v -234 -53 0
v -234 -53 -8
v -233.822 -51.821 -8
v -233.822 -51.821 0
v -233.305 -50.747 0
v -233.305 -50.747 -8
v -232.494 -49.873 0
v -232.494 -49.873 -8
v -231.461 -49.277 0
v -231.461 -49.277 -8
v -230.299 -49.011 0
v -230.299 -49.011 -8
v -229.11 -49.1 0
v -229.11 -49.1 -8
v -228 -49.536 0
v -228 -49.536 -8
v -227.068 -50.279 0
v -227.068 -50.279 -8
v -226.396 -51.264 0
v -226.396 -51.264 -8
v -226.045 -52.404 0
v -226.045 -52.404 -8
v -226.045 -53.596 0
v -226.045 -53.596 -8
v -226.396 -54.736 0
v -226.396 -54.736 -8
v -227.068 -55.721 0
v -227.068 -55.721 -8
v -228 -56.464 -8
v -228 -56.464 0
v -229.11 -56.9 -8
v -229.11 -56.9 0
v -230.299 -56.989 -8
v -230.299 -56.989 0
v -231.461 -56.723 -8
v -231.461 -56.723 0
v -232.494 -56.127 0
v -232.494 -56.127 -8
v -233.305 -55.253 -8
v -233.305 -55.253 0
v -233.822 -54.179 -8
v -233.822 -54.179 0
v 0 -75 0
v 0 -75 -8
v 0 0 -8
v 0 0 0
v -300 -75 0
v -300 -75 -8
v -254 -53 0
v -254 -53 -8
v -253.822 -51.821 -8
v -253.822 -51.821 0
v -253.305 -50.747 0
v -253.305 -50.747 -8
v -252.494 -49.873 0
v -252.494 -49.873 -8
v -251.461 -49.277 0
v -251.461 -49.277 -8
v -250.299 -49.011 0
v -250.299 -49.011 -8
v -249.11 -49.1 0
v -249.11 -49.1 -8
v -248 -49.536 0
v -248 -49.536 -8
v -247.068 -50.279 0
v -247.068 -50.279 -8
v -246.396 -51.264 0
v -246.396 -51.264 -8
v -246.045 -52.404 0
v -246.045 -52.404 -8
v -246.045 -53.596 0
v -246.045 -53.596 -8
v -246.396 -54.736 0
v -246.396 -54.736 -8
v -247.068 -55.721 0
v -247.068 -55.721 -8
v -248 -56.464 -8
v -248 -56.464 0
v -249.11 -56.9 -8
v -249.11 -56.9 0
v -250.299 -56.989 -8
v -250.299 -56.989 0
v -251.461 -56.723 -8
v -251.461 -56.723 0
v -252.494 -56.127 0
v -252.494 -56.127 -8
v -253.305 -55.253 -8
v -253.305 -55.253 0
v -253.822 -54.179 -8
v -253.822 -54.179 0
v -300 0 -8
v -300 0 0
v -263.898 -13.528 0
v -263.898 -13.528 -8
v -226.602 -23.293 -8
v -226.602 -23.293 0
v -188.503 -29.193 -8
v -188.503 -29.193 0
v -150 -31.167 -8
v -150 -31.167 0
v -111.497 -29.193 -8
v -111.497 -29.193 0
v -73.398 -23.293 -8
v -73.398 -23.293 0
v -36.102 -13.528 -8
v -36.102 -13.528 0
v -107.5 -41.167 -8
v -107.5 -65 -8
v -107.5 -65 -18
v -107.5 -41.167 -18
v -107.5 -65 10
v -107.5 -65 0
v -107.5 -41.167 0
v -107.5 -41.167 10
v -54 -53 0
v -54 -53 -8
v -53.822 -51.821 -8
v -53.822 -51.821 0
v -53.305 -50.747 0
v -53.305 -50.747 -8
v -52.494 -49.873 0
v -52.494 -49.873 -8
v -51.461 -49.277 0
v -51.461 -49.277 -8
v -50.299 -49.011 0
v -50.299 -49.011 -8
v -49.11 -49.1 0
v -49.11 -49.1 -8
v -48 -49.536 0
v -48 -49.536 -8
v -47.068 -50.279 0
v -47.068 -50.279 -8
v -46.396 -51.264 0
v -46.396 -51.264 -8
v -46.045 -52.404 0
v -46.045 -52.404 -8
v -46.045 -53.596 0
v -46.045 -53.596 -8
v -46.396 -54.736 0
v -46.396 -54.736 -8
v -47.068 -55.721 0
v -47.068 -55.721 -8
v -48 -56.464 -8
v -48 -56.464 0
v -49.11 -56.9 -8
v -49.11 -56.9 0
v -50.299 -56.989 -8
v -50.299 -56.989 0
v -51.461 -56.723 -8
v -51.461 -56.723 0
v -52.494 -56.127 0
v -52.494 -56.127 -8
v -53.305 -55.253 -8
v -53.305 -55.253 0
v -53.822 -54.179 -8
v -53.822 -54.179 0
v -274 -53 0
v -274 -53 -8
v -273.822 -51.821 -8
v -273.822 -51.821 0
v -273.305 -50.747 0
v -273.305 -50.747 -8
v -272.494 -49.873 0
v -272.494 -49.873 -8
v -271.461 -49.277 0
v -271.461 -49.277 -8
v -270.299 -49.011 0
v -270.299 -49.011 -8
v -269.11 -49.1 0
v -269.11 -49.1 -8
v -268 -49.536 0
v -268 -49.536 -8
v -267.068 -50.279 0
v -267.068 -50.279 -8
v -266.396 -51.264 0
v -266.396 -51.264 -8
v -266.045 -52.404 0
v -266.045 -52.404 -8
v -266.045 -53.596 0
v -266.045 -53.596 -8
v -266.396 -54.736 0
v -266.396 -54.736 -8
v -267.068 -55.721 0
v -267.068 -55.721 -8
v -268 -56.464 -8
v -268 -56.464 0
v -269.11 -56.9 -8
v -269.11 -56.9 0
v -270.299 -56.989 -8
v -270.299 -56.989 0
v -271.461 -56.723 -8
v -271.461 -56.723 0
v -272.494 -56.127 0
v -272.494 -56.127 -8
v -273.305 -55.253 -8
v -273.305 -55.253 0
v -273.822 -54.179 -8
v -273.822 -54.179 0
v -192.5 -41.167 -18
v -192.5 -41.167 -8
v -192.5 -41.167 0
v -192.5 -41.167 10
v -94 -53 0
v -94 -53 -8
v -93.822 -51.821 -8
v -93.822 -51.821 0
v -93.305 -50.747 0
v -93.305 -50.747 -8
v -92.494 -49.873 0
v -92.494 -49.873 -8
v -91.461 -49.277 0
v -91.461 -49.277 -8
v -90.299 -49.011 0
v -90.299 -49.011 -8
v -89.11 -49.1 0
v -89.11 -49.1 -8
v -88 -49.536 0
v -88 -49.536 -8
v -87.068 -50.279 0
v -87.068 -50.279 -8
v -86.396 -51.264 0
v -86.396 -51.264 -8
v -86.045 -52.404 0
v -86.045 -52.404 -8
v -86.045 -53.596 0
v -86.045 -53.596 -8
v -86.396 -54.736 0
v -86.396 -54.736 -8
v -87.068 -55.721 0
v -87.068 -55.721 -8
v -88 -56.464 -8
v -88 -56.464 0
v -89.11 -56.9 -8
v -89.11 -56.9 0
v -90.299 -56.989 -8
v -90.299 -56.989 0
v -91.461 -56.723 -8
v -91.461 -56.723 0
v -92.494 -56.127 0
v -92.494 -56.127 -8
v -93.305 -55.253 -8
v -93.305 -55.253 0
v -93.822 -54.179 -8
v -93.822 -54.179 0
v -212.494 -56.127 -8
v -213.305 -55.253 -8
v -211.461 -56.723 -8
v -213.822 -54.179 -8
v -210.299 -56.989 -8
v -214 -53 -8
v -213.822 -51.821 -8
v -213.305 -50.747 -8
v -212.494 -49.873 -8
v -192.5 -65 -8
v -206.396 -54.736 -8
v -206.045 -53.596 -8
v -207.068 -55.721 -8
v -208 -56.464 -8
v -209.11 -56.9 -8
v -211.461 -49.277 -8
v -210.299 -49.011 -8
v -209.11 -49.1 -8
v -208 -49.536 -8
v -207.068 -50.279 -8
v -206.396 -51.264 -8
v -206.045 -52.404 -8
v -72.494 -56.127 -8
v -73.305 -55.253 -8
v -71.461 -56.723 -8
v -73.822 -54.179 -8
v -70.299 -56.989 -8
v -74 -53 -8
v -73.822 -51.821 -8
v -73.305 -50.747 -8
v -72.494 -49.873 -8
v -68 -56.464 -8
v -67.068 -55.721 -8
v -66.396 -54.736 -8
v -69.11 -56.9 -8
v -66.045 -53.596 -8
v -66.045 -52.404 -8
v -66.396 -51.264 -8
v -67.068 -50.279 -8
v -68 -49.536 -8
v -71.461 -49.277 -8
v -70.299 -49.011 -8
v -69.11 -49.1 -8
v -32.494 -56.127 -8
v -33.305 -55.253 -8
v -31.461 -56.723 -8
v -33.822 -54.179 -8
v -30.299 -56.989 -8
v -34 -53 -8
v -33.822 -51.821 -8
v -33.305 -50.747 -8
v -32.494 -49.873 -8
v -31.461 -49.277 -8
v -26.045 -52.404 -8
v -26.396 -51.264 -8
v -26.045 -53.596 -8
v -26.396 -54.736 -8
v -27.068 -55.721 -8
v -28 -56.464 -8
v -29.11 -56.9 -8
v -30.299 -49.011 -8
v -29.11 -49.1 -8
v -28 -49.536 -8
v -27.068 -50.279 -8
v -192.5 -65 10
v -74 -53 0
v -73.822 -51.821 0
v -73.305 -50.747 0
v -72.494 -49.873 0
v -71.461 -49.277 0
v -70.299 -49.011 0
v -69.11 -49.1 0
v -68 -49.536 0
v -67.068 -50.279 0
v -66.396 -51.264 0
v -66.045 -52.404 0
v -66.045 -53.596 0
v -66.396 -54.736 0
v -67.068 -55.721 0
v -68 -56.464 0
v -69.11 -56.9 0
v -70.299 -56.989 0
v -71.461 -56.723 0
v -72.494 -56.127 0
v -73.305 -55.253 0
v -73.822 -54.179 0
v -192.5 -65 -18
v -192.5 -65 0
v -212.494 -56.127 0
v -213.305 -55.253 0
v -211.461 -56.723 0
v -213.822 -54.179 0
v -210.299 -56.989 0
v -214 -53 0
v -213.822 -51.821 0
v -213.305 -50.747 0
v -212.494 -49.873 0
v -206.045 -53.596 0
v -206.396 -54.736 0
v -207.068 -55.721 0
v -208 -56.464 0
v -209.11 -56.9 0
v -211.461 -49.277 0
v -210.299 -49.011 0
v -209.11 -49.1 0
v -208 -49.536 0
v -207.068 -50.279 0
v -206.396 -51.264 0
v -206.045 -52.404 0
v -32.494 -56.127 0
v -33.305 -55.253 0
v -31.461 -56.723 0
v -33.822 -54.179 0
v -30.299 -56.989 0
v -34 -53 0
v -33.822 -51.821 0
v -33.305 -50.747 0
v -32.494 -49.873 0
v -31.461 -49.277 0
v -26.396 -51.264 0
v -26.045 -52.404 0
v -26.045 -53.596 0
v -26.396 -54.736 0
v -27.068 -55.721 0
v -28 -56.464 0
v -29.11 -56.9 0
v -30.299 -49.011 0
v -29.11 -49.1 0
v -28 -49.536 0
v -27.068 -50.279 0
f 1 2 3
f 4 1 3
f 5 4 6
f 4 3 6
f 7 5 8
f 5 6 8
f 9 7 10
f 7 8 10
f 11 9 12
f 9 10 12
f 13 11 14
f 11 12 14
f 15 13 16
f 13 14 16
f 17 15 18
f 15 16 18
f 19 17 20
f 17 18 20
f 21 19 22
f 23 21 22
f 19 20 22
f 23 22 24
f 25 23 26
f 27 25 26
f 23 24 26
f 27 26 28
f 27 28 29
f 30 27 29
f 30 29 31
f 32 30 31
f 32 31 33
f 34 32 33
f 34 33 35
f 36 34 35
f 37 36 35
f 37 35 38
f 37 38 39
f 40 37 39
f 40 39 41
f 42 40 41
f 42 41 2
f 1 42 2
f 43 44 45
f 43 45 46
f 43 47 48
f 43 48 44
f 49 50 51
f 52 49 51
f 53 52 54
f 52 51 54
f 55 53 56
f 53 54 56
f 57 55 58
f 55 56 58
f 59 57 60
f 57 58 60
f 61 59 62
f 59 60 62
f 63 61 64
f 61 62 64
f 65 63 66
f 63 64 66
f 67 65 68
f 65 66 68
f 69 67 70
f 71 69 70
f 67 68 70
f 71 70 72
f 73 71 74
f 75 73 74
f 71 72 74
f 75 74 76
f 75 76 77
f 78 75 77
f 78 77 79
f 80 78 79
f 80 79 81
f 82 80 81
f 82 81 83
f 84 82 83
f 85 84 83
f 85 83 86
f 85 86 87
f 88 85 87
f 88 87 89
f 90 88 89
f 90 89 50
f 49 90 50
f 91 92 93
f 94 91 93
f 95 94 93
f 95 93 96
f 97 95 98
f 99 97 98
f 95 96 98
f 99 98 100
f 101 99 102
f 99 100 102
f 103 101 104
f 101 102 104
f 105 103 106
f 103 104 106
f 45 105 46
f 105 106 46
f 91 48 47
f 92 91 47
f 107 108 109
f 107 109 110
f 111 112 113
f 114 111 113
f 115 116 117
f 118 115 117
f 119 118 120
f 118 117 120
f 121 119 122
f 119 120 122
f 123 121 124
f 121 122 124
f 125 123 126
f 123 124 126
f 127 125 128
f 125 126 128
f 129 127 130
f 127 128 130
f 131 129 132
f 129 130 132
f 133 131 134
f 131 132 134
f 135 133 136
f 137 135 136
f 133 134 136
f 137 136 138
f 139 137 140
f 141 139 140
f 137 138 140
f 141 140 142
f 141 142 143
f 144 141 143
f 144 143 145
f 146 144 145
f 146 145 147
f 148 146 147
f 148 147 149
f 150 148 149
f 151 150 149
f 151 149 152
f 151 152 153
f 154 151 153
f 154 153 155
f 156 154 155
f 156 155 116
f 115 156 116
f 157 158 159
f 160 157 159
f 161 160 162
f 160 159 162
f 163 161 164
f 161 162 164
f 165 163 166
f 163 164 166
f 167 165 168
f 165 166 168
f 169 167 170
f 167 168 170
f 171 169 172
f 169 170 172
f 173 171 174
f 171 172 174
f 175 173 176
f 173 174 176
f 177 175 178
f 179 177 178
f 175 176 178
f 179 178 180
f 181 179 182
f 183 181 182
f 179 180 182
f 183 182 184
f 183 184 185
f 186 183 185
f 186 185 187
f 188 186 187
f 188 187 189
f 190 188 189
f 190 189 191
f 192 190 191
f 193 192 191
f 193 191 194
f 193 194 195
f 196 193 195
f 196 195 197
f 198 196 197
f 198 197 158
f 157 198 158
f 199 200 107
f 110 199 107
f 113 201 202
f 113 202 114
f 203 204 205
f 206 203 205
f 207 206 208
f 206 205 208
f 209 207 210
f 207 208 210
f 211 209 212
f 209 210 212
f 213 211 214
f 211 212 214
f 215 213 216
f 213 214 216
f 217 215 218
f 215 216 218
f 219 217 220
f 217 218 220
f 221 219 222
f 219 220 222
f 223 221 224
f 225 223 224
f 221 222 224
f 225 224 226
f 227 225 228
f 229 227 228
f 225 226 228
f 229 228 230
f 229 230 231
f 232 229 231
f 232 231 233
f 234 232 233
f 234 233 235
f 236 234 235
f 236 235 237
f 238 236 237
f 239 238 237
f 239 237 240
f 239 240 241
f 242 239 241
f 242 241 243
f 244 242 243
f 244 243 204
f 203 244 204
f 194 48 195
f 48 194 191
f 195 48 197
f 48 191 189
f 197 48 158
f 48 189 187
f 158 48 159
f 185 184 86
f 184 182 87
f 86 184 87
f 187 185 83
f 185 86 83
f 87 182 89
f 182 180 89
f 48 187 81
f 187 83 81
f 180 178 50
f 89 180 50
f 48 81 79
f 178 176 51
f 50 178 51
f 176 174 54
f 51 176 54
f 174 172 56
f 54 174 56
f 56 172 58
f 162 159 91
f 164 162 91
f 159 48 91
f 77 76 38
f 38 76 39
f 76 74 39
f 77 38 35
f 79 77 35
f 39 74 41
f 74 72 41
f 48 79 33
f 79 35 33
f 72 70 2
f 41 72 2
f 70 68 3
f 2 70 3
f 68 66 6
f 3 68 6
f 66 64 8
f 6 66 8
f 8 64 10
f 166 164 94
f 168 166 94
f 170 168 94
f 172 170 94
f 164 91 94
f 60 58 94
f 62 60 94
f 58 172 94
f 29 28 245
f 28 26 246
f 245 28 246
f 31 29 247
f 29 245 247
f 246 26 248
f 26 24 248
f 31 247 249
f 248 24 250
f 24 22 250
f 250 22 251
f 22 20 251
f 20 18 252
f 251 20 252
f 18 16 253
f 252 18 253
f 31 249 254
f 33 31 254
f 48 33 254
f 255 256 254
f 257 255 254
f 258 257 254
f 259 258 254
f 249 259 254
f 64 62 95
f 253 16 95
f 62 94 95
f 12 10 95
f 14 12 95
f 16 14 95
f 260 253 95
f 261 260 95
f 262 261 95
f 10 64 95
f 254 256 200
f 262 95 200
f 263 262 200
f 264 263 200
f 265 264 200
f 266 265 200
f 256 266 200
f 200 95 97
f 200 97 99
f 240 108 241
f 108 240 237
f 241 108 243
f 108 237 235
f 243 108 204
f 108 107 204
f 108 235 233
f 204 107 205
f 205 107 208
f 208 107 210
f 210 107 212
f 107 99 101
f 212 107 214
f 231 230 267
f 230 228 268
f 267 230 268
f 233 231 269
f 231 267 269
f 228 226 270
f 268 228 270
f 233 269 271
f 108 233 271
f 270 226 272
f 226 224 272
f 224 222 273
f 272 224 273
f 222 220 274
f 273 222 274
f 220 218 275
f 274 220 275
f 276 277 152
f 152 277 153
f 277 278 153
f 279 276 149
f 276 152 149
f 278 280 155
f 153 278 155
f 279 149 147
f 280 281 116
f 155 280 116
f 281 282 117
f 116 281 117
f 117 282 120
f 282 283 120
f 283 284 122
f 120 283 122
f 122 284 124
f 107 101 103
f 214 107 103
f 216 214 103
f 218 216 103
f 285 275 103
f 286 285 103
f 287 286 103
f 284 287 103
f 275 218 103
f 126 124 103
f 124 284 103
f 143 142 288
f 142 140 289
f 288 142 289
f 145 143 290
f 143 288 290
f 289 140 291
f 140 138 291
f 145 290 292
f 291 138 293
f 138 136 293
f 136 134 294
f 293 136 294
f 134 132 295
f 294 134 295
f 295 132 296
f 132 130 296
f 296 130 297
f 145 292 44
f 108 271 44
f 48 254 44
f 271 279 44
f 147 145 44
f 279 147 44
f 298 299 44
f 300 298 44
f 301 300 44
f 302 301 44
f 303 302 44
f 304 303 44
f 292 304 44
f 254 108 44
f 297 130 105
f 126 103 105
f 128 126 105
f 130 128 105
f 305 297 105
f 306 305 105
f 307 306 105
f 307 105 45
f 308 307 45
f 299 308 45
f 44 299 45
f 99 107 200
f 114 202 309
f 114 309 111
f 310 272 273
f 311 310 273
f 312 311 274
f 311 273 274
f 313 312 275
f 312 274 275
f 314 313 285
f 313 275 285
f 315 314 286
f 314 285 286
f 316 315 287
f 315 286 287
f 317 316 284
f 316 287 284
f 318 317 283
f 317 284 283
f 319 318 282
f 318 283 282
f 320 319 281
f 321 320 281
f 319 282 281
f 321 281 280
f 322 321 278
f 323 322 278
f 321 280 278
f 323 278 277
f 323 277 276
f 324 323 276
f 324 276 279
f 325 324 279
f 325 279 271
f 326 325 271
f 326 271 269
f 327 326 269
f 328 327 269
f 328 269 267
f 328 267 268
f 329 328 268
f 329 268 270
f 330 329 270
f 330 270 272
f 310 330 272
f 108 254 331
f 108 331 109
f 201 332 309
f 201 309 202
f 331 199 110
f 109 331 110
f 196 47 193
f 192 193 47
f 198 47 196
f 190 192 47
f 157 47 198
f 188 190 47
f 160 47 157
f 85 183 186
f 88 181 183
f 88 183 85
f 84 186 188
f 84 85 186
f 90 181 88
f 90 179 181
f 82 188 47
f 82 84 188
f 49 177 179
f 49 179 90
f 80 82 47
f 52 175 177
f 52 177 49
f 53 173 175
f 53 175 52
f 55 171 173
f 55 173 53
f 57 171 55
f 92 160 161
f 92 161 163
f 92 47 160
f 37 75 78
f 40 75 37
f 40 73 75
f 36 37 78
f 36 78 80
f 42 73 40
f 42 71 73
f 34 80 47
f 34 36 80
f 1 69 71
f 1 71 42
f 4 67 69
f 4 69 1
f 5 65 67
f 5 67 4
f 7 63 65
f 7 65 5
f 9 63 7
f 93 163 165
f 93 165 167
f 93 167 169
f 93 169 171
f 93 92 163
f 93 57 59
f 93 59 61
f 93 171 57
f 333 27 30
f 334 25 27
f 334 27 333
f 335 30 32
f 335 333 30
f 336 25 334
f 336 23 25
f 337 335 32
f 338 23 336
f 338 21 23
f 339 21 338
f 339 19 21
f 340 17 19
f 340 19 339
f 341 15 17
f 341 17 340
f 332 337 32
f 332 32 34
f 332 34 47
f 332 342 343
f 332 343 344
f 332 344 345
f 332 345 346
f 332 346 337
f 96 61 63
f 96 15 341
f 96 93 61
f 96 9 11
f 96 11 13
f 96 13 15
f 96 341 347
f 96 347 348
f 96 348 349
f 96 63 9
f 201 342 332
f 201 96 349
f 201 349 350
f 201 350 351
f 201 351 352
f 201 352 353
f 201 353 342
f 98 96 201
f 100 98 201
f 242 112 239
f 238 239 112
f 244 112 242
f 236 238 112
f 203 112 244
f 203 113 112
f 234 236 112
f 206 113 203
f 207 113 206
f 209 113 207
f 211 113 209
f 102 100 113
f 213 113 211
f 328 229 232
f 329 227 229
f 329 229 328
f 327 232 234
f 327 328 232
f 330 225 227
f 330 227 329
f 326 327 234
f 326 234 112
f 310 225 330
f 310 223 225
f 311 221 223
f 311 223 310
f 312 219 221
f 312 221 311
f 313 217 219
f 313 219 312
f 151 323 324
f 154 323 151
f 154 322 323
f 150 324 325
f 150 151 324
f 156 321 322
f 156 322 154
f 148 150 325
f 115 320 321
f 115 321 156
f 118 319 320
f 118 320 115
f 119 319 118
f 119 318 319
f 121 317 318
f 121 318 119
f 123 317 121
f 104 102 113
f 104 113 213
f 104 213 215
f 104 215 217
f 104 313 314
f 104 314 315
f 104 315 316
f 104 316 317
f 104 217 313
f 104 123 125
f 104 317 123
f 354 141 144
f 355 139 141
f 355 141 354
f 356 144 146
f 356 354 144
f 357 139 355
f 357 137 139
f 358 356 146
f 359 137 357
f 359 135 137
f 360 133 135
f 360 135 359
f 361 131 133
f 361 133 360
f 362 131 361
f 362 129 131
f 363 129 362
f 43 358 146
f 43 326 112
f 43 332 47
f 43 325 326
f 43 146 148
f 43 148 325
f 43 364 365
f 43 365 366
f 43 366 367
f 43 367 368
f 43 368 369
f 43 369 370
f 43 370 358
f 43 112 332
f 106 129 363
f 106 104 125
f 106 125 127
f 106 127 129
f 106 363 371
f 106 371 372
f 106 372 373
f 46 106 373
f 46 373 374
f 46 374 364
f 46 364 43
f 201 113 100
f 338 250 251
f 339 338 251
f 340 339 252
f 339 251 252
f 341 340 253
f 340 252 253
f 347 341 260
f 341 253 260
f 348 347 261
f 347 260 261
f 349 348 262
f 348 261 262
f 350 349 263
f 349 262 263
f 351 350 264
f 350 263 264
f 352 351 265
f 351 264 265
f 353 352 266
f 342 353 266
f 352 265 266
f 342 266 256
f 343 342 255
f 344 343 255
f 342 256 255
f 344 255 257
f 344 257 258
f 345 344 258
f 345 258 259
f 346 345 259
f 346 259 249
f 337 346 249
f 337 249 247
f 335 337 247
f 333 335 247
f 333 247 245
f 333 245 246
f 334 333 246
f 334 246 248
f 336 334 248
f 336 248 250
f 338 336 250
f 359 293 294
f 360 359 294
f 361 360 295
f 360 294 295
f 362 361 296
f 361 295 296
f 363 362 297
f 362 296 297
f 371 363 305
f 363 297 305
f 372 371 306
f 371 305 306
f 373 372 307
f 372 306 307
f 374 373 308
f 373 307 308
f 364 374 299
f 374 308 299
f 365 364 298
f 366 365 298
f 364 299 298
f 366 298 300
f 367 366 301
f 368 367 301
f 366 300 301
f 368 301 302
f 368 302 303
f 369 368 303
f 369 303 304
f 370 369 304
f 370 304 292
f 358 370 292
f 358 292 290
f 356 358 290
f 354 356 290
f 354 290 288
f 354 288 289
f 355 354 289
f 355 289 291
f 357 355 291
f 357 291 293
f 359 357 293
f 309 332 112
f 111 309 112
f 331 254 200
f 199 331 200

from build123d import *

# Parameters (mm, degrees)
F4_W          = 300
F4_H          = 8
F0_DEPTH      = 75
F5_DEPTH      = 25
F6_D          = 8
F7_W          = 85
F7_H          = 23.832924
F3_DEPTH      = 10
F3_DEPTH_BACK = 18


with BuildPart() as f0:
    # F4 (on Front) → F0 (new body)
    with BuildSketch(Plane.XZ):
        with Locations((-150, -4)):
            Rectangle(F4_W, F4_H)
    extrude(amount=F0_DEPTH)

    # F1 (on face) → F5 (cut)
    with BuildSketch(Plane.XY):
        with BuildLine():
            Line((0, 0), (-300, 0))
            ThreePointArc((-300, 0), (-150, -31.167076), (0, 0))
        make_face()
    extrude(amount=-F5_DEPTH, mode=Mode.SUBTRACT)

    # F6 (through all)
    with Locations(Plane.XY):
        with Locations((-270, -53), (-250, -53), (-230.000013, -53), (-210.000013, -53), (-90, -53), (-70, -53), (-50, -53), (-30, -53)):
            Hole(F6_D / 2)

    # F7 (on face) → F3 (join, two sides)
    with BuildSketch(Plane.XY) as f3_sk:
        with Locations((-150, -53.083538)):
            Rectangle(F7_W, F7_H)
    extrude(amount=F3_DEPTH)
    extrude(f3_sk.sketch, amount=-F3_DEPTH_BACK)


solid = f0.part
